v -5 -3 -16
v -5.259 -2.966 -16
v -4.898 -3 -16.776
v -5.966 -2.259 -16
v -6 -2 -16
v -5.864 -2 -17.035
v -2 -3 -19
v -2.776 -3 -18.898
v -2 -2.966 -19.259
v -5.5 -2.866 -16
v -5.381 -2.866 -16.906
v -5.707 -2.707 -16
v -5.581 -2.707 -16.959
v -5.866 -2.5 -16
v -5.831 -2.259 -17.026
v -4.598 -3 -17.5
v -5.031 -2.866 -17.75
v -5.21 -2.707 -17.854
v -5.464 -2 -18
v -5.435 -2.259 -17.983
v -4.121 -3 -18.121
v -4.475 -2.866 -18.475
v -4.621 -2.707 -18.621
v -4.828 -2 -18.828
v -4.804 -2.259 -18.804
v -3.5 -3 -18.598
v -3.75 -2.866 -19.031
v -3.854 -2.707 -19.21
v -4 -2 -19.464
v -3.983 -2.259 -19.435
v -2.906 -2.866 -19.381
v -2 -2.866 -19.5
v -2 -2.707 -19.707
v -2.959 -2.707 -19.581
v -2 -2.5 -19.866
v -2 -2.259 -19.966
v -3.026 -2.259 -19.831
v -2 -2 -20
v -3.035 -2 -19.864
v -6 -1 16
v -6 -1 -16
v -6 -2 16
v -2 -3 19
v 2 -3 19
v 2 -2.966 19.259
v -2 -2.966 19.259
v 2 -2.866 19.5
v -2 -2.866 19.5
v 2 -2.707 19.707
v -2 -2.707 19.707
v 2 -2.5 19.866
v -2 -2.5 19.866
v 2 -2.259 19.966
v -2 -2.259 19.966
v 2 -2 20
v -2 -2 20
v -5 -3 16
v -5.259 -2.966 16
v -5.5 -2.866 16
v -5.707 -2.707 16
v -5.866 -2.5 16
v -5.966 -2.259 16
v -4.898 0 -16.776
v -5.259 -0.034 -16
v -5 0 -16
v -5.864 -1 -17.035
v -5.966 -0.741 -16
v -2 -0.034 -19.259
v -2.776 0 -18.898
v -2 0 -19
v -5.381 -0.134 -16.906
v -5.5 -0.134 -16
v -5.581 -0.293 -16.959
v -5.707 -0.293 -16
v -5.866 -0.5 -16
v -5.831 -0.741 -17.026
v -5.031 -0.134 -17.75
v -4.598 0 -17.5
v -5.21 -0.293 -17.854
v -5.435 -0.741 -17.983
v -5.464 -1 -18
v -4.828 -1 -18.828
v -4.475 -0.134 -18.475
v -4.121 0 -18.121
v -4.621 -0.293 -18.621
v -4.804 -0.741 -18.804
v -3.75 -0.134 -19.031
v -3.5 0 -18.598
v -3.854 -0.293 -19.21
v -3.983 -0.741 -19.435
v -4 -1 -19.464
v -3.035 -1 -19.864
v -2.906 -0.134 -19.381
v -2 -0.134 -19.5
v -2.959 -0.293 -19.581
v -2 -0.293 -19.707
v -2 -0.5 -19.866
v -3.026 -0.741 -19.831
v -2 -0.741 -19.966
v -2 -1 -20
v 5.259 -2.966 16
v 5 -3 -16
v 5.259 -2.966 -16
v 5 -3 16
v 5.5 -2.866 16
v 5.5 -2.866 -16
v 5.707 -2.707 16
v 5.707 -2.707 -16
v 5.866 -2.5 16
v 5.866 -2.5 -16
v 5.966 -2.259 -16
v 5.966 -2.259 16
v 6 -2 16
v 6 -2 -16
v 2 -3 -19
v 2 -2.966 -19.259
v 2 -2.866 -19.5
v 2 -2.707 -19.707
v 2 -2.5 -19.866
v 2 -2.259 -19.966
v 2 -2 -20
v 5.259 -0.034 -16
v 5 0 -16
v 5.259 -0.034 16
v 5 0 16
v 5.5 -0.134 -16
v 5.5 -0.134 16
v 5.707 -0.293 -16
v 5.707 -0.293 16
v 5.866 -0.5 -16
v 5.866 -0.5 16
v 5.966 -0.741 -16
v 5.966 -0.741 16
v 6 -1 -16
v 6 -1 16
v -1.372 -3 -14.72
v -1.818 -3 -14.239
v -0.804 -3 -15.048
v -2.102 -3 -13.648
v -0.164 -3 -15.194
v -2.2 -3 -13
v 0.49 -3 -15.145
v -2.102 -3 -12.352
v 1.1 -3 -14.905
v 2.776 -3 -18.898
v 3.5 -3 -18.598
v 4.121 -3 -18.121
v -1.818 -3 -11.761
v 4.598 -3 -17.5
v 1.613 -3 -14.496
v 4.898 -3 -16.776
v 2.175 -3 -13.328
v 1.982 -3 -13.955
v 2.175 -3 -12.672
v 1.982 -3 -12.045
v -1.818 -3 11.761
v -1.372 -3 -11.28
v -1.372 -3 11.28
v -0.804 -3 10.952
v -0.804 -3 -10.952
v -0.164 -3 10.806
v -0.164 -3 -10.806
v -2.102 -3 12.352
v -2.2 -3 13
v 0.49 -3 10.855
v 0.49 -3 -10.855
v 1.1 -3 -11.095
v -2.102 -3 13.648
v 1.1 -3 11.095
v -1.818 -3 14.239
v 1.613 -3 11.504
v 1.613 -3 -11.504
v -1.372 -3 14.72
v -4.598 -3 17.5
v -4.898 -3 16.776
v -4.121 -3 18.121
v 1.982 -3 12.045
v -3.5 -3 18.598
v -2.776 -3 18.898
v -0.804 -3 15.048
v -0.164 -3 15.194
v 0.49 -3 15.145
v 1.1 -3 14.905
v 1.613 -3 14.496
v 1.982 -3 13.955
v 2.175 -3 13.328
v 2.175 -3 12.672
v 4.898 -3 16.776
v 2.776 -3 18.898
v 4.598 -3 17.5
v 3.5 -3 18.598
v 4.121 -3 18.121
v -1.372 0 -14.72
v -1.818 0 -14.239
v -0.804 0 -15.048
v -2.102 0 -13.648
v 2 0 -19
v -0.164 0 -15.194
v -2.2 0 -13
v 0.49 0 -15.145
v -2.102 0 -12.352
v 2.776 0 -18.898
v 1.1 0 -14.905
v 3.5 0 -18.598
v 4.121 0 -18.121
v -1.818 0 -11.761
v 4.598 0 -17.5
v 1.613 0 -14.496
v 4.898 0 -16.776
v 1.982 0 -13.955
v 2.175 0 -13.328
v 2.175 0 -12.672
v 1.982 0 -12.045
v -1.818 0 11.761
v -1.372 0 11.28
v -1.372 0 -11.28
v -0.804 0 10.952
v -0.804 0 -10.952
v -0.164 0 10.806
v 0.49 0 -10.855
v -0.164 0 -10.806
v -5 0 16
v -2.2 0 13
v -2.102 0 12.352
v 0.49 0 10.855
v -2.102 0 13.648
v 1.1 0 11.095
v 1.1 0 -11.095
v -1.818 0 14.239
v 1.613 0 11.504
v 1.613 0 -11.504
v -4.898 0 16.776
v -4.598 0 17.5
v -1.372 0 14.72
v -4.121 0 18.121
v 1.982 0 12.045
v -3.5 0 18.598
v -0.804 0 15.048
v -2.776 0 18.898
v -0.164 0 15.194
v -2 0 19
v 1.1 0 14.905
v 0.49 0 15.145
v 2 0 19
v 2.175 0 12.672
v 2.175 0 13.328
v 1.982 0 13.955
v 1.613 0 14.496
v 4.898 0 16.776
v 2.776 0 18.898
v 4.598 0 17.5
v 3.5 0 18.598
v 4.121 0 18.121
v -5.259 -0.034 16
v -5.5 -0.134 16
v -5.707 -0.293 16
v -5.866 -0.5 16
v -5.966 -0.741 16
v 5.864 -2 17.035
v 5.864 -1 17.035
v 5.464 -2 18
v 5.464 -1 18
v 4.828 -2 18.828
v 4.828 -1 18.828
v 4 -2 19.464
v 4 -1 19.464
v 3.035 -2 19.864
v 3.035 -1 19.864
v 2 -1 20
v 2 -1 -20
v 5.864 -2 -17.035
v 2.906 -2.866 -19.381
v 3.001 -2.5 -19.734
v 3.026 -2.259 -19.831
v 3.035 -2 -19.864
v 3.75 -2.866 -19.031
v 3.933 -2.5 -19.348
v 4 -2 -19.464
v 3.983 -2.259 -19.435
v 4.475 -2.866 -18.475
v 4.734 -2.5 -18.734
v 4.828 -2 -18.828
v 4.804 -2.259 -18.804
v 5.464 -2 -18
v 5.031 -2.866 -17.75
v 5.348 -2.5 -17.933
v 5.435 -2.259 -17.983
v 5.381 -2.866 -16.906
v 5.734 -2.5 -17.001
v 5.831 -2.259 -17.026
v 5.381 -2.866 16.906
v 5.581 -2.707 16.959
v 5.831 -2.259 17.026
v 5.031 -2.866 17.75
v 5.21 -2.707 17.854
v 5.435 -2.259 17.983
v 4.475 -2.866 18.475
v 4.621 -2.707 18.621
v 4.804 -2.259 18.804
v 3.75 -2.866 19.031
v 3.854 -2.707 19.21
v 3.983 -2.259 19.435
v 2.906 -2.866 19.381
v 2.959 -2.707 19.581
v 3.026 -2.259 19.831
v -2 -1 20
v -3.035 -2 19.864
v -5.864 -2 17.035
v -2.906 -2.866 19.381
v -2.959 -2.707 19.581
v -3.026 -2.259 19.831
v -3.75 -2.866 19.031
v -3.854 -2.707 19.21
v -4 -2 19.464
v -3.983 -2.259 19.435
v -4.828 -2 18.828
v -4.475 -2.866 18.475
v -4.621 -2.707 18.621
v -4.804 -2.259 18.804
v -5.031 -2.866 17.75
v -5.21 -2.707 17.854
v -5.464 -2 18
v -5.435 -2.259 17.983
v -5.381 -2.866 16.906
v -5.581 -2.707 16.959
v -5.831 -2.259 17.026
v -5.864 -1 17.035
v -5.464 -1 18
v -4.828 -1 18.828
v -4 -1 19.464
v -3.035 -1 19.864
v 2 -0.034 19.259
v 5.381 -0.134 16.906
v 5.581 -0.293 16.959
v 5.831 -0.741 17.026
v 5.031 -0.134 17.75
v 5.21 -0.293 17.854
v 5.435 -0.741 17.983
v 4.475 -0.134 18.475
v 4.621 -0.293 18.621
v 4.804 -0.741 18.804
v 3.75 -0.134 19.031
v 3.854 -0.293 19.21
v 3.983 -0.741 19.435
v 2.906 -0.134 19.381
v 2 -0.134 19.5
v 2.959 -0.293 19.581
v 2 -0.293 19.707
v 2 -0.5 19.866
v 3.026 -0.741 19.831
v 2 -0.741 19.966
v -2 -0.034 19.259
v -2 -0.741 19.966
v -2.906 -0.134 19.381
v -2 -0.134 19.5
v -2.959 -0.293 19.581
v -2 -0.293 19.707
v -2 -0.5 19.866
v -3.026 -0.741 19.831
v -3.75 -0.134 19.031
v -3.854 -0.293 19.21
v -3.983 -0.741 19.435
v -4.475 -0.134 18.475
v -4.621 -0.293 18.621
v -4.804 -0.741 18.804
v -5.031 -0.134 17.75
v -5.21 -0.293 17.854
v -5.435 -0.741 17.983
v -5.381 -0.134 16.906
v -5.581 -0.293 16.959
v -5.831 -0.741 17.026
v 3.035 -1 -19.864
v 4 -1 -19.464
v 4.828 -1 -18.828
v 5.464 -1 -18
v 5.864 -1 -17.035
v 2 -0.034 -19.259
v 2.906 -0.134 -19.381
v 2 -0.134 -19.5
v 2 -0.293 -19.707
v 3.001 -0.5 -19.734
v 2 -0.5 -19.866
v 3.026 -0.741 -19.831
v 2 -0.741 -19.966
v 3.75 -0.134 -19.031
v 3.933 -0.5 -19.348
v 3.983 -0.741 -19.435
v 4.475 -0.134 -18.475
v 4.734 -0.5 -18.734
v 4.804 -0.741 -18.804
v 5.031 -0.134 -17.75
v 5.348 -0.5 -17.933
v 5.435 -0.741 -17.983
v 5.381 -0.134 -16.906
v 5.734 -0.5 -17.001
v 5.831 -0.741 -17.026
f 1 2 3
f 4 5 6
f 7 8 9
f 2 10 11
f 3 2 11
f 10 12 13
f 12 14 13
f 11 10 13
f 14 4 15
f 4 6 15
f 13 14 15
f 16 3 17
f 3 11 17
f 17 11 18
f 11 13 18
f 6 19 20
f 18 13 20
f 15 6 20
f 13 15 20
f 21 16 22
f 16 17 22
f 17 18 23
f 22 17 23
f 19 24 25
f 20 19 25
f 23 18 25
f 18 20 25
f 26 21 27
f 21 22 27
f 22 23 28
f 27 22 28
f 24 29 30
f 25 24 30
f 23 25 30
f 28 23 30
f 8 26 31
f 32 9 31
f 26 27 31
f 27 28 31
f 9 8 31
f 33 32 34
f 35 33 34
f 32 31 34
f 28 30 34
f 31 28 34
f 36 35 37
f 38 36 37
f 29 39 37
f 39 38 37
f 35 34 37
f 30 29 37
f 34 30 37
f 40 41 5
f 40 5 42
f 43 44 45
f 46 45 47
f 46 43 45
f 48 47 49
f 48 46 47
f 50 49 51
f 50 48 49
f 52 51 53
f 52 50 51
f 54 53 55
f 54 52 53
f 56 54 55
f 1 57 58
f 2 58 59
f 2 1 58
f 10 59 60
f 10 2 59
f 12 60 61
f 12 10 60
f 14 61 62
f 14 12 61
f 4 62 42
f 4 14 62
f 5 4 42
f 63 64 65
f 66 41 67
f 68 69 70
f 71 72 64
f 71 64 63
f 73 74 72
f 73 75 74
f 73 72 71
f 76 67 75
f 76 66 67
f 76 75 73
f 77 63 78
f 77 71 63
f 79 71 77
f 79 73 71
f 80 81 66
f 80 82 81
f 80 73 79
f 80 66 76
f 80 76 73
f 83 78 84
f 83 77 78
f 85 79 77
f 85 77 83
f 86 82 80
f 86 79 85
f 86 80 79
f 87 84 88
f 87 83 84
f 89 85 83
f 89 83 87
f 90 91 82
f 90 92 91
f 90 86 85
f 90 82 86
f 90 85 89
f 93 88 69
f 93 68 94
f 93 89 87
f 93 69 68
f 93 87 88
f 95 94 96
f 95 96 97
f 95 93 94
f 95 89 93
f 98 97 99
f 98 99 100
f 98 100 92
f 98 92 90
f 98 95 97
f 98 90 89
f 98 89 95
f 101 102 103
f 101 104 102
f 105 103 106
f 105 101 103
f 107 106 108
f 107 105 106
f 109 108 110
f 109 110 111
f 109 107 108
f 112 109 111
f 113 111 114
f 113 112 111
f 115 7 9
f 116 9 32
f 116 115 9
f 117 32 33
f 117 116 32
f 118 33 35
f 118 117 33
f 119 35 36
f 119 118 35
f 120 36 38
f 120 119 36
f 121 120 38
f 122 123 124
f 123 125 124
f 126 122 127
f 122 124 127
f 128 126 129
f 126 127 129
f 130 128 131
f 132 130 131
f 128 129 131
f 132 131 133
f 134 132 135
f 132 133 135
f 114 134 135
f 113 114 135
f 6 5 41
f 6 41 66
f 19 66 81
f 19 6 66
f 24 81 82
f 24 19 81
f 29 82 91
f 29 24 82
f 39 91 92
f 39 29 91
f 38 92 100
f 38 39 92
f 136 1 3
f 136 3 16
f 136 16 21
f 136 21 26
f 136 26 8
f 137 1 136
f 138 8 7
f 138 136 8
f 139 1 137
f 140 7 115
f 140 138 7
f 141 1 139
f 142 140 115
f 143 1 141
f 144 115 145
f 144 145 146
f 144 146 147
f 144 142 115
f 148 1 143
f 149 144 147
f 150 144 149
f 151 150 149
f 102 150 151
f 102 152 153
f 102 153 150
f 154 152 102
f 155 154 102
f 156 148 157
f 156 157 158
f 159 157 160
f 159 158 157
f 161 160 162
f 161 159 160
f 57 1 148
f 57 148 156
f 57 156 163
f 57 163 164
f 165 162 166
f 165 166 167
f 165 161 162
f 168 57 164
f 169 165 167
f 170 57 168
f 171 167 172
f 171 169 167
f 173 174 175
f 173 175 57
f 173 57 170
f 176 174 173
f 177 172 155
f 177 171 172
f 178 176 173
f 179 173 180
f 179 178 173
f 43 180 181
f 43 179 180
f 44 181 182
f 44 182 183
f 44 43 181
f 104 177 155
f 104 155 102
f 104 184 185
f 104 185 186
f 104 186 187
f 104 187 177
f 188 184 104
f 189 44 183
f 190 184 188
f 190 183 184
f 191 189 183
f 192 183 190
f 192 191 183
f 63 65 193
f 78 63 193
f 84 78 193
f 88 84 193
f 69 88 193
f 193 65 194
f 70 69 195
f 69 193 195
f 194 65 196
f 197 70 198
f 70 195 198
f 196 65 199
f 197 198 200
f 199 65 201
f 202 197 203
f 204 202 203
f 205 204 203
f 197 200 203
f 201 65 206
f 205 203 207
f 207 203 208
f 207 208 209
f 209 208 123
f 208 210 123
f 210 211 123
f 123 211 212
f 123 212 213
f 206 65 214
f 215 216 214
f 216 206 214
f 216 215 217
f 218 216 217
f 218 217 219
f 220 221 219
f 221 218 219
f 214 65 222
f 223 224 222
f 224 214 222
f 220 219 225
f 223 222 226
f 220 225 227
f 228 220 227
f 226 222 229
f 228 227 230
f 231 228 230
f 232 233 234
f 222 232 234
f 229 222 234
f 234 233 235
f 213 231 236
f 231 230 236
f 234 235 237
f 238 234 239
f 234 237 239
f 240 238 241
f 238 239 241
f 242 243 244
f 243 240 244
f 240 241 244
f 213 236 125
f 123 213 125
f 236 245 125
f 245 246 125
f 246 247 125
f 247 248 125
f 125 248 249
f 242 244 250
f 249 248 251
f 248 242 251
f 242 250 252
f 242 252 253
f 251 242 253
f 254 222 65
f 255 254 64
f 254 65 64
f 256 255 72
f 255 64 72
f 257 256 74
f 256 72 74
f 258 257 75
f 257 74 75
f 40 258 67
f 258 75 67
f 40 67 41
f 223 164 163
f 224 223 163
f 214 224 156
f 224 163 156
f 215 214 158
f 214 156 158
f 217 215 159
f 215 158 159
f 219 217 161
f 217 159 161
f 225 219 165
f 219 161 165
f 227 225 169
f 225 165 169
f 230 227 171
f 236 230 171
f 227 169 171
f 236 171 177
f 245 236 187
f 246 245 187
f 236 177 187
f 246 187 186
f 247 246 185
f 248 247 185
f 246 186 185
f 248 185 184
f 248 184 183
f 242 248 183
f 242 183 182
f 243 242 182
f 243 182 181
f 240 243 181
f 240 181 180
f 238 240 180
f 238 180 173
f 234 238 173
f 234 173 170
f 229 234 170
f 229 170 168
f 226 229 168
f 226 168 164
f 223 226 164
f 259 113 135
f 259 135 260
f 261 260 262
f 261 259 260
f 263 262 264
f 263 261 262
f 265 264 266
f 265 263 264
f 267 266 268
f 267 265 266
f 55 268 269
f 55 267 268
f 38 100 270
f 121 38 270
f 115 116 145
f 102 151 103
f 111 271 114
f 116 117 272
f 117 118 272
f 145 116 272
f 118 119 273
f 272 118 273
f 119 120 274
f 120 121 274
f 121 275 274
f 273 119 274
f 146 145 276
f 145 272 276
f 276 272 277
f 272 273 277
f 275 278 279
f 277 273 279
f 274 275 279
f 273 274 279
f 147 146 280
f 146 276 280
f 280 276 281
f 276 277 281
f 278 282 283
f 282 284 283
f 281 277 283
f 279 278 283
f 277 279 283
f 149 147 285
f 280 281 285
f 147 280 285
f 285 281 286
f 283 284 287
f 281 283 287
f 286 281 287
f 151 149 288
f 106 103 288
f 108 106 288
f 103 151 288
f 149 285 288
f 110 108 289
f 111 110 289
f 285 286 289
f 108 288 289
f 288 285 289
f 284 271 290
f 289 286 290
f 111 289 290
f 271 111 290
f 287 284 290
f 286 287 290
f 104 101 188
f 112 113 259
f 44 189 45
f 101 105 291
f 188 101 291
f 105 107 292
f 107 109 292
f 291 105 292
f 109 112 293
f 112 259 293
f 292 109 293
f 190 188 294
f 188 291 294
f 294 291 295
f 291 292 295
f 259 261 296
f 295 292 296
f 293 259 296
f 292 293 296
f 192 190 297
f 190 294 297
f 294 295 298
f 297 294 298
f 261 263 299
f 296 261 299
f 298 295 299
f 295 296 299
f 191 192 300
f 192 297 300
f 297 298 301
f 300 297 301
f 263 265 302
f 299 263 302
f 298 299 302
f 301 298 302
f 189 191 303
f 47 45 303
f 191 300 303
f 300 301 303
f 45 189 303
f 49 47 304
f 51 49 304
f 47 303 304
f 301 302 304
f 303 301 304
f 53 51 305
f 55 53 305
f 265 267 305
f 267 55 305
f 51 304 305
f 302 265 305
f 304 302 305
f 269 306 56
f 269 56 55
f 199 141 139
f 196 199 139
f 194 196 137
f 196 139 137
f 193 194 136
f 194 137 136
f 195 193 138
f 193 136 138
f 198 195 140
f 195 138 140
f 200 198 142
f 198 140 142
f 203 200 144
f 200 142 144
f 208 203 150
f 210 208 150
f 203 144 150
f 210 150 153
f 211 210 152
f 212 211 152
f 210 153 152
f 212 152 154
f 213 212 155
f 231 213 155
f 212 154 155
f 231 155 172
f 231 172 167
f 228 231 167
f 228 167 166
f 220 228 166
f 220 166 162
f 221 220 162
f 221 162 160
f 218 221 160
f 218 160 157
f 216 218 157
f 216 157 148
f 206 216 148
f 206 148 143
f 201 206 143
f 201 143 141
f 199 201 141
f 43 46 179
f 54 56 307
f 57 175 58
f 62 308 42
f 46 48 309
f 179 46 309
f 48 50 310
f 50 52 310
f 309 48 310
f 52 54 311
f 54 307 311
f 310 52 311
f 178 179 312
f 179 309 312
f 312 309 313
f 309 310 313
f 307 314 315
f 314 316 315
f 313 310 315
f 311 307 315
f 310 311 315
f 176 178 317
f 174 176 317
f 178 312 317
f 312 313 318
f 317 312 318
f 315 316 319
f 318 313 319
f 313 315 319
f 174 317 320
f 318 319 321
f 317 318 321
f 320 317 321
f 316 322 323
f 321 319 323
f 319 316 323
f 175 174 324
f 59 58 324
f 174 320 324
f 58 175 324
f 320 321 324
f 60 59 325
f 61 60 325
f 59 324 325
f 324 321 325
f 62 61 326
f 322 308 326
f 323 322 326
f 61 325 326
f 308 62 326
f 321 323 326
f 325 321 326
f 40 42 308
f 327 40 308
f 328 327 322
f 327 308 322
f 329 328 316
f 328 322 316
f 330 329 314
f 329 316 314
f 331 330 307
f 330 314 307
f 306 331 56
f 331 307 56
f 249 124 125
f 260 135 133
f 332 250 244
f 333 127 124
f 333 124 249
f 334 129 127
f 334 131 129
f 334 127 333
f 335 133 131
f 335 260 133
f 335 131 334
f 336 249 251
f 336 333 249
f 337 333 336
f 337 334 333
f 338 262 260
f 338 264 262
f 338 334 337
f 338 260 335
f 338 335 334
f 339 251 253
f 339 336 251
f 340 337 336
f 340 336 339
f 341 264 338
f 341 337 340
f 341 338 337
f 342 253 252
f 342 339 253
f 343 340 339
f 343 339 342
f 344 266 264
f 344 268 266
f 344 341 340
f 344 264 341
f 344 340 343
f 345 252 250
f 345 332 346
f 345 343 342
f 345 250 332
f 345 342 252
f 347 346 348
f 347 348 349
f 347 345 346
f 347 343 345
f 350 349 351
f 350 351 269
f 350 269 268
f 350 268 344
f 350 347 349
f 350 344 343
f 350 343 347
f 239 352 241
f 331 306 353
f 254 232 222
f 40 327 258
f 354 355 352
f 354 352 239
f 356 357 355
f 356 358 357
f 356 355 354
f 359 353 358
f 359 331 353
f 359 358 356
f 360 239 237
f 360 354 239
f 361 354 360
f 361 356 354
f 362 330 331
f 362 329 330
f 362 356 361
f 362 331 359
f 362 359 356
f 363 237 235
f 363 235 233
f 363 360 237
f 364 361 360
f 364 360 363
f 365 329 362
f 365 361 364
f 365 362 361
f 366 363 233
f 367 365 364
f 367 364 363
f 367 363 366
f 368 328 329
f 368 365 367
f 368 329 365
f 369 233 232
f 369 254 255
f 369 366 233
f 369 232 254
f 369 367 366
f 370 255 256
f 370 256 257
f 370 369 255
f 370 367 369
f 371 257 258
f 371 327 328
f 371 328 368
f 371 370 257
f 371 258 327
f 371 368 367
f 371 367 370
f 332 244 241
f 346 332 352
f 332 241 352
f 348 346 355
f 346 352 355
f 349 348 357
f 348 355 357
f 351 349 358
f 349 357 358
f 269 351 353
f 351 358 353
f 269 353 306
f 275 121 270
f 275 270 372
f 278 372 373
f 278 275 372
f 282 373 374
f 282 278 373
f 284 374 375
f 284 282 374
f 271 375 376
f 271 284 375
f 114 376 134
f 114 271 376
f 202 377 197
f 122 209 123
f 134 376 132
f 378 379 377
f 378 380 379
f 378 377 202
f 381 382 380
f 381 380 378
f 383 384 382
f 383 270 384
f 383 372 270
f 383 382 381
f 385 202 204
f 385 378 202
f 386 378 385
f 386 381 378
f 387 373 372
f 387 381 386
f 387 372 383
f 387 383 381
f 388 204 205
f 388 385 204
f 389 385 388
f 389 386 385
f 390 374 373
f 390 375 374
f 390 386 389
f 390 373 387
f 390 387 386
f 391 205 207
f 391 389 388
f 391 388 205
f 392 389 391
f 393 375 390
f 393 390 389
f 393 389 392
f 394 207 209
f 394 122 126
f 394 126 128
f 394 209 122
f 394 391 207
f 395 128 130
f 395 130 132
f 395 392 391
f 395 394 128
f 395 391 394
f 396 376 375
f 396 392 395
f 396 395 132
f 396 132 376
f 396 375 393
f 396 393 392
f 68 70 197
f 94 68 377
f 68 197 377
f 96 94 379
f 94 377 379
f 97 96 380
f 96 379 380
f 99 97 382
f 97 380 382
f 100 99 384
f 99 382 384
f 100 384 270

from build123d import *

# Parameters (mm, degrees)
F0_W           = 12
F0_H           = 40
F1_DEPTH       = 3
F2_R           = 4
F3_R           = 1
F5_D           = 4.4
F5_DEPTH       = 30
F5_CBORE_D     = 4.4
F5_CBORE_DEPTH = 4


with BuildPart() as f1:
    # F0 (on Front) → F1 (new body)
    with BuildSketch(Plane.XZ):
        Rectangle(F0_W, F0_H)
    extrude(amount=F1_DEPTH)

    # F2
    f2_edges = [f1.edges().sort_by_distance(p)[0] for p in [
        (6, -1.5, 20),
        (-6, -1.5, 20),
        (6, -1.5, -20),
        (-6, -1.5, -20),
    ]]
    fillet(f2_edges, radius=F2_R)

    # F3
    f3_edges = [f1.edges().sort_by_distance(p)[0] for p in [
        (6, -3, 0),
        (6, 0, 0),
        (-6, 0, 0),
        (-6, -3, 0),
    ]]
    fillet(f3_edges, radius=F3_R)

    # F5
    with Locations(Plane(origin=(0, 0, 0), x_dir=(1, 0, 0), z_dir=(0, 1, 0))):
        with Locations((0, 13), (0, -13)):
            CounterBoreHole(F5_D / 2, F5_CBORE_D / 2, F5_CBORE_DEPTH, depth=F5_DEPTH)


solid = f1.part
